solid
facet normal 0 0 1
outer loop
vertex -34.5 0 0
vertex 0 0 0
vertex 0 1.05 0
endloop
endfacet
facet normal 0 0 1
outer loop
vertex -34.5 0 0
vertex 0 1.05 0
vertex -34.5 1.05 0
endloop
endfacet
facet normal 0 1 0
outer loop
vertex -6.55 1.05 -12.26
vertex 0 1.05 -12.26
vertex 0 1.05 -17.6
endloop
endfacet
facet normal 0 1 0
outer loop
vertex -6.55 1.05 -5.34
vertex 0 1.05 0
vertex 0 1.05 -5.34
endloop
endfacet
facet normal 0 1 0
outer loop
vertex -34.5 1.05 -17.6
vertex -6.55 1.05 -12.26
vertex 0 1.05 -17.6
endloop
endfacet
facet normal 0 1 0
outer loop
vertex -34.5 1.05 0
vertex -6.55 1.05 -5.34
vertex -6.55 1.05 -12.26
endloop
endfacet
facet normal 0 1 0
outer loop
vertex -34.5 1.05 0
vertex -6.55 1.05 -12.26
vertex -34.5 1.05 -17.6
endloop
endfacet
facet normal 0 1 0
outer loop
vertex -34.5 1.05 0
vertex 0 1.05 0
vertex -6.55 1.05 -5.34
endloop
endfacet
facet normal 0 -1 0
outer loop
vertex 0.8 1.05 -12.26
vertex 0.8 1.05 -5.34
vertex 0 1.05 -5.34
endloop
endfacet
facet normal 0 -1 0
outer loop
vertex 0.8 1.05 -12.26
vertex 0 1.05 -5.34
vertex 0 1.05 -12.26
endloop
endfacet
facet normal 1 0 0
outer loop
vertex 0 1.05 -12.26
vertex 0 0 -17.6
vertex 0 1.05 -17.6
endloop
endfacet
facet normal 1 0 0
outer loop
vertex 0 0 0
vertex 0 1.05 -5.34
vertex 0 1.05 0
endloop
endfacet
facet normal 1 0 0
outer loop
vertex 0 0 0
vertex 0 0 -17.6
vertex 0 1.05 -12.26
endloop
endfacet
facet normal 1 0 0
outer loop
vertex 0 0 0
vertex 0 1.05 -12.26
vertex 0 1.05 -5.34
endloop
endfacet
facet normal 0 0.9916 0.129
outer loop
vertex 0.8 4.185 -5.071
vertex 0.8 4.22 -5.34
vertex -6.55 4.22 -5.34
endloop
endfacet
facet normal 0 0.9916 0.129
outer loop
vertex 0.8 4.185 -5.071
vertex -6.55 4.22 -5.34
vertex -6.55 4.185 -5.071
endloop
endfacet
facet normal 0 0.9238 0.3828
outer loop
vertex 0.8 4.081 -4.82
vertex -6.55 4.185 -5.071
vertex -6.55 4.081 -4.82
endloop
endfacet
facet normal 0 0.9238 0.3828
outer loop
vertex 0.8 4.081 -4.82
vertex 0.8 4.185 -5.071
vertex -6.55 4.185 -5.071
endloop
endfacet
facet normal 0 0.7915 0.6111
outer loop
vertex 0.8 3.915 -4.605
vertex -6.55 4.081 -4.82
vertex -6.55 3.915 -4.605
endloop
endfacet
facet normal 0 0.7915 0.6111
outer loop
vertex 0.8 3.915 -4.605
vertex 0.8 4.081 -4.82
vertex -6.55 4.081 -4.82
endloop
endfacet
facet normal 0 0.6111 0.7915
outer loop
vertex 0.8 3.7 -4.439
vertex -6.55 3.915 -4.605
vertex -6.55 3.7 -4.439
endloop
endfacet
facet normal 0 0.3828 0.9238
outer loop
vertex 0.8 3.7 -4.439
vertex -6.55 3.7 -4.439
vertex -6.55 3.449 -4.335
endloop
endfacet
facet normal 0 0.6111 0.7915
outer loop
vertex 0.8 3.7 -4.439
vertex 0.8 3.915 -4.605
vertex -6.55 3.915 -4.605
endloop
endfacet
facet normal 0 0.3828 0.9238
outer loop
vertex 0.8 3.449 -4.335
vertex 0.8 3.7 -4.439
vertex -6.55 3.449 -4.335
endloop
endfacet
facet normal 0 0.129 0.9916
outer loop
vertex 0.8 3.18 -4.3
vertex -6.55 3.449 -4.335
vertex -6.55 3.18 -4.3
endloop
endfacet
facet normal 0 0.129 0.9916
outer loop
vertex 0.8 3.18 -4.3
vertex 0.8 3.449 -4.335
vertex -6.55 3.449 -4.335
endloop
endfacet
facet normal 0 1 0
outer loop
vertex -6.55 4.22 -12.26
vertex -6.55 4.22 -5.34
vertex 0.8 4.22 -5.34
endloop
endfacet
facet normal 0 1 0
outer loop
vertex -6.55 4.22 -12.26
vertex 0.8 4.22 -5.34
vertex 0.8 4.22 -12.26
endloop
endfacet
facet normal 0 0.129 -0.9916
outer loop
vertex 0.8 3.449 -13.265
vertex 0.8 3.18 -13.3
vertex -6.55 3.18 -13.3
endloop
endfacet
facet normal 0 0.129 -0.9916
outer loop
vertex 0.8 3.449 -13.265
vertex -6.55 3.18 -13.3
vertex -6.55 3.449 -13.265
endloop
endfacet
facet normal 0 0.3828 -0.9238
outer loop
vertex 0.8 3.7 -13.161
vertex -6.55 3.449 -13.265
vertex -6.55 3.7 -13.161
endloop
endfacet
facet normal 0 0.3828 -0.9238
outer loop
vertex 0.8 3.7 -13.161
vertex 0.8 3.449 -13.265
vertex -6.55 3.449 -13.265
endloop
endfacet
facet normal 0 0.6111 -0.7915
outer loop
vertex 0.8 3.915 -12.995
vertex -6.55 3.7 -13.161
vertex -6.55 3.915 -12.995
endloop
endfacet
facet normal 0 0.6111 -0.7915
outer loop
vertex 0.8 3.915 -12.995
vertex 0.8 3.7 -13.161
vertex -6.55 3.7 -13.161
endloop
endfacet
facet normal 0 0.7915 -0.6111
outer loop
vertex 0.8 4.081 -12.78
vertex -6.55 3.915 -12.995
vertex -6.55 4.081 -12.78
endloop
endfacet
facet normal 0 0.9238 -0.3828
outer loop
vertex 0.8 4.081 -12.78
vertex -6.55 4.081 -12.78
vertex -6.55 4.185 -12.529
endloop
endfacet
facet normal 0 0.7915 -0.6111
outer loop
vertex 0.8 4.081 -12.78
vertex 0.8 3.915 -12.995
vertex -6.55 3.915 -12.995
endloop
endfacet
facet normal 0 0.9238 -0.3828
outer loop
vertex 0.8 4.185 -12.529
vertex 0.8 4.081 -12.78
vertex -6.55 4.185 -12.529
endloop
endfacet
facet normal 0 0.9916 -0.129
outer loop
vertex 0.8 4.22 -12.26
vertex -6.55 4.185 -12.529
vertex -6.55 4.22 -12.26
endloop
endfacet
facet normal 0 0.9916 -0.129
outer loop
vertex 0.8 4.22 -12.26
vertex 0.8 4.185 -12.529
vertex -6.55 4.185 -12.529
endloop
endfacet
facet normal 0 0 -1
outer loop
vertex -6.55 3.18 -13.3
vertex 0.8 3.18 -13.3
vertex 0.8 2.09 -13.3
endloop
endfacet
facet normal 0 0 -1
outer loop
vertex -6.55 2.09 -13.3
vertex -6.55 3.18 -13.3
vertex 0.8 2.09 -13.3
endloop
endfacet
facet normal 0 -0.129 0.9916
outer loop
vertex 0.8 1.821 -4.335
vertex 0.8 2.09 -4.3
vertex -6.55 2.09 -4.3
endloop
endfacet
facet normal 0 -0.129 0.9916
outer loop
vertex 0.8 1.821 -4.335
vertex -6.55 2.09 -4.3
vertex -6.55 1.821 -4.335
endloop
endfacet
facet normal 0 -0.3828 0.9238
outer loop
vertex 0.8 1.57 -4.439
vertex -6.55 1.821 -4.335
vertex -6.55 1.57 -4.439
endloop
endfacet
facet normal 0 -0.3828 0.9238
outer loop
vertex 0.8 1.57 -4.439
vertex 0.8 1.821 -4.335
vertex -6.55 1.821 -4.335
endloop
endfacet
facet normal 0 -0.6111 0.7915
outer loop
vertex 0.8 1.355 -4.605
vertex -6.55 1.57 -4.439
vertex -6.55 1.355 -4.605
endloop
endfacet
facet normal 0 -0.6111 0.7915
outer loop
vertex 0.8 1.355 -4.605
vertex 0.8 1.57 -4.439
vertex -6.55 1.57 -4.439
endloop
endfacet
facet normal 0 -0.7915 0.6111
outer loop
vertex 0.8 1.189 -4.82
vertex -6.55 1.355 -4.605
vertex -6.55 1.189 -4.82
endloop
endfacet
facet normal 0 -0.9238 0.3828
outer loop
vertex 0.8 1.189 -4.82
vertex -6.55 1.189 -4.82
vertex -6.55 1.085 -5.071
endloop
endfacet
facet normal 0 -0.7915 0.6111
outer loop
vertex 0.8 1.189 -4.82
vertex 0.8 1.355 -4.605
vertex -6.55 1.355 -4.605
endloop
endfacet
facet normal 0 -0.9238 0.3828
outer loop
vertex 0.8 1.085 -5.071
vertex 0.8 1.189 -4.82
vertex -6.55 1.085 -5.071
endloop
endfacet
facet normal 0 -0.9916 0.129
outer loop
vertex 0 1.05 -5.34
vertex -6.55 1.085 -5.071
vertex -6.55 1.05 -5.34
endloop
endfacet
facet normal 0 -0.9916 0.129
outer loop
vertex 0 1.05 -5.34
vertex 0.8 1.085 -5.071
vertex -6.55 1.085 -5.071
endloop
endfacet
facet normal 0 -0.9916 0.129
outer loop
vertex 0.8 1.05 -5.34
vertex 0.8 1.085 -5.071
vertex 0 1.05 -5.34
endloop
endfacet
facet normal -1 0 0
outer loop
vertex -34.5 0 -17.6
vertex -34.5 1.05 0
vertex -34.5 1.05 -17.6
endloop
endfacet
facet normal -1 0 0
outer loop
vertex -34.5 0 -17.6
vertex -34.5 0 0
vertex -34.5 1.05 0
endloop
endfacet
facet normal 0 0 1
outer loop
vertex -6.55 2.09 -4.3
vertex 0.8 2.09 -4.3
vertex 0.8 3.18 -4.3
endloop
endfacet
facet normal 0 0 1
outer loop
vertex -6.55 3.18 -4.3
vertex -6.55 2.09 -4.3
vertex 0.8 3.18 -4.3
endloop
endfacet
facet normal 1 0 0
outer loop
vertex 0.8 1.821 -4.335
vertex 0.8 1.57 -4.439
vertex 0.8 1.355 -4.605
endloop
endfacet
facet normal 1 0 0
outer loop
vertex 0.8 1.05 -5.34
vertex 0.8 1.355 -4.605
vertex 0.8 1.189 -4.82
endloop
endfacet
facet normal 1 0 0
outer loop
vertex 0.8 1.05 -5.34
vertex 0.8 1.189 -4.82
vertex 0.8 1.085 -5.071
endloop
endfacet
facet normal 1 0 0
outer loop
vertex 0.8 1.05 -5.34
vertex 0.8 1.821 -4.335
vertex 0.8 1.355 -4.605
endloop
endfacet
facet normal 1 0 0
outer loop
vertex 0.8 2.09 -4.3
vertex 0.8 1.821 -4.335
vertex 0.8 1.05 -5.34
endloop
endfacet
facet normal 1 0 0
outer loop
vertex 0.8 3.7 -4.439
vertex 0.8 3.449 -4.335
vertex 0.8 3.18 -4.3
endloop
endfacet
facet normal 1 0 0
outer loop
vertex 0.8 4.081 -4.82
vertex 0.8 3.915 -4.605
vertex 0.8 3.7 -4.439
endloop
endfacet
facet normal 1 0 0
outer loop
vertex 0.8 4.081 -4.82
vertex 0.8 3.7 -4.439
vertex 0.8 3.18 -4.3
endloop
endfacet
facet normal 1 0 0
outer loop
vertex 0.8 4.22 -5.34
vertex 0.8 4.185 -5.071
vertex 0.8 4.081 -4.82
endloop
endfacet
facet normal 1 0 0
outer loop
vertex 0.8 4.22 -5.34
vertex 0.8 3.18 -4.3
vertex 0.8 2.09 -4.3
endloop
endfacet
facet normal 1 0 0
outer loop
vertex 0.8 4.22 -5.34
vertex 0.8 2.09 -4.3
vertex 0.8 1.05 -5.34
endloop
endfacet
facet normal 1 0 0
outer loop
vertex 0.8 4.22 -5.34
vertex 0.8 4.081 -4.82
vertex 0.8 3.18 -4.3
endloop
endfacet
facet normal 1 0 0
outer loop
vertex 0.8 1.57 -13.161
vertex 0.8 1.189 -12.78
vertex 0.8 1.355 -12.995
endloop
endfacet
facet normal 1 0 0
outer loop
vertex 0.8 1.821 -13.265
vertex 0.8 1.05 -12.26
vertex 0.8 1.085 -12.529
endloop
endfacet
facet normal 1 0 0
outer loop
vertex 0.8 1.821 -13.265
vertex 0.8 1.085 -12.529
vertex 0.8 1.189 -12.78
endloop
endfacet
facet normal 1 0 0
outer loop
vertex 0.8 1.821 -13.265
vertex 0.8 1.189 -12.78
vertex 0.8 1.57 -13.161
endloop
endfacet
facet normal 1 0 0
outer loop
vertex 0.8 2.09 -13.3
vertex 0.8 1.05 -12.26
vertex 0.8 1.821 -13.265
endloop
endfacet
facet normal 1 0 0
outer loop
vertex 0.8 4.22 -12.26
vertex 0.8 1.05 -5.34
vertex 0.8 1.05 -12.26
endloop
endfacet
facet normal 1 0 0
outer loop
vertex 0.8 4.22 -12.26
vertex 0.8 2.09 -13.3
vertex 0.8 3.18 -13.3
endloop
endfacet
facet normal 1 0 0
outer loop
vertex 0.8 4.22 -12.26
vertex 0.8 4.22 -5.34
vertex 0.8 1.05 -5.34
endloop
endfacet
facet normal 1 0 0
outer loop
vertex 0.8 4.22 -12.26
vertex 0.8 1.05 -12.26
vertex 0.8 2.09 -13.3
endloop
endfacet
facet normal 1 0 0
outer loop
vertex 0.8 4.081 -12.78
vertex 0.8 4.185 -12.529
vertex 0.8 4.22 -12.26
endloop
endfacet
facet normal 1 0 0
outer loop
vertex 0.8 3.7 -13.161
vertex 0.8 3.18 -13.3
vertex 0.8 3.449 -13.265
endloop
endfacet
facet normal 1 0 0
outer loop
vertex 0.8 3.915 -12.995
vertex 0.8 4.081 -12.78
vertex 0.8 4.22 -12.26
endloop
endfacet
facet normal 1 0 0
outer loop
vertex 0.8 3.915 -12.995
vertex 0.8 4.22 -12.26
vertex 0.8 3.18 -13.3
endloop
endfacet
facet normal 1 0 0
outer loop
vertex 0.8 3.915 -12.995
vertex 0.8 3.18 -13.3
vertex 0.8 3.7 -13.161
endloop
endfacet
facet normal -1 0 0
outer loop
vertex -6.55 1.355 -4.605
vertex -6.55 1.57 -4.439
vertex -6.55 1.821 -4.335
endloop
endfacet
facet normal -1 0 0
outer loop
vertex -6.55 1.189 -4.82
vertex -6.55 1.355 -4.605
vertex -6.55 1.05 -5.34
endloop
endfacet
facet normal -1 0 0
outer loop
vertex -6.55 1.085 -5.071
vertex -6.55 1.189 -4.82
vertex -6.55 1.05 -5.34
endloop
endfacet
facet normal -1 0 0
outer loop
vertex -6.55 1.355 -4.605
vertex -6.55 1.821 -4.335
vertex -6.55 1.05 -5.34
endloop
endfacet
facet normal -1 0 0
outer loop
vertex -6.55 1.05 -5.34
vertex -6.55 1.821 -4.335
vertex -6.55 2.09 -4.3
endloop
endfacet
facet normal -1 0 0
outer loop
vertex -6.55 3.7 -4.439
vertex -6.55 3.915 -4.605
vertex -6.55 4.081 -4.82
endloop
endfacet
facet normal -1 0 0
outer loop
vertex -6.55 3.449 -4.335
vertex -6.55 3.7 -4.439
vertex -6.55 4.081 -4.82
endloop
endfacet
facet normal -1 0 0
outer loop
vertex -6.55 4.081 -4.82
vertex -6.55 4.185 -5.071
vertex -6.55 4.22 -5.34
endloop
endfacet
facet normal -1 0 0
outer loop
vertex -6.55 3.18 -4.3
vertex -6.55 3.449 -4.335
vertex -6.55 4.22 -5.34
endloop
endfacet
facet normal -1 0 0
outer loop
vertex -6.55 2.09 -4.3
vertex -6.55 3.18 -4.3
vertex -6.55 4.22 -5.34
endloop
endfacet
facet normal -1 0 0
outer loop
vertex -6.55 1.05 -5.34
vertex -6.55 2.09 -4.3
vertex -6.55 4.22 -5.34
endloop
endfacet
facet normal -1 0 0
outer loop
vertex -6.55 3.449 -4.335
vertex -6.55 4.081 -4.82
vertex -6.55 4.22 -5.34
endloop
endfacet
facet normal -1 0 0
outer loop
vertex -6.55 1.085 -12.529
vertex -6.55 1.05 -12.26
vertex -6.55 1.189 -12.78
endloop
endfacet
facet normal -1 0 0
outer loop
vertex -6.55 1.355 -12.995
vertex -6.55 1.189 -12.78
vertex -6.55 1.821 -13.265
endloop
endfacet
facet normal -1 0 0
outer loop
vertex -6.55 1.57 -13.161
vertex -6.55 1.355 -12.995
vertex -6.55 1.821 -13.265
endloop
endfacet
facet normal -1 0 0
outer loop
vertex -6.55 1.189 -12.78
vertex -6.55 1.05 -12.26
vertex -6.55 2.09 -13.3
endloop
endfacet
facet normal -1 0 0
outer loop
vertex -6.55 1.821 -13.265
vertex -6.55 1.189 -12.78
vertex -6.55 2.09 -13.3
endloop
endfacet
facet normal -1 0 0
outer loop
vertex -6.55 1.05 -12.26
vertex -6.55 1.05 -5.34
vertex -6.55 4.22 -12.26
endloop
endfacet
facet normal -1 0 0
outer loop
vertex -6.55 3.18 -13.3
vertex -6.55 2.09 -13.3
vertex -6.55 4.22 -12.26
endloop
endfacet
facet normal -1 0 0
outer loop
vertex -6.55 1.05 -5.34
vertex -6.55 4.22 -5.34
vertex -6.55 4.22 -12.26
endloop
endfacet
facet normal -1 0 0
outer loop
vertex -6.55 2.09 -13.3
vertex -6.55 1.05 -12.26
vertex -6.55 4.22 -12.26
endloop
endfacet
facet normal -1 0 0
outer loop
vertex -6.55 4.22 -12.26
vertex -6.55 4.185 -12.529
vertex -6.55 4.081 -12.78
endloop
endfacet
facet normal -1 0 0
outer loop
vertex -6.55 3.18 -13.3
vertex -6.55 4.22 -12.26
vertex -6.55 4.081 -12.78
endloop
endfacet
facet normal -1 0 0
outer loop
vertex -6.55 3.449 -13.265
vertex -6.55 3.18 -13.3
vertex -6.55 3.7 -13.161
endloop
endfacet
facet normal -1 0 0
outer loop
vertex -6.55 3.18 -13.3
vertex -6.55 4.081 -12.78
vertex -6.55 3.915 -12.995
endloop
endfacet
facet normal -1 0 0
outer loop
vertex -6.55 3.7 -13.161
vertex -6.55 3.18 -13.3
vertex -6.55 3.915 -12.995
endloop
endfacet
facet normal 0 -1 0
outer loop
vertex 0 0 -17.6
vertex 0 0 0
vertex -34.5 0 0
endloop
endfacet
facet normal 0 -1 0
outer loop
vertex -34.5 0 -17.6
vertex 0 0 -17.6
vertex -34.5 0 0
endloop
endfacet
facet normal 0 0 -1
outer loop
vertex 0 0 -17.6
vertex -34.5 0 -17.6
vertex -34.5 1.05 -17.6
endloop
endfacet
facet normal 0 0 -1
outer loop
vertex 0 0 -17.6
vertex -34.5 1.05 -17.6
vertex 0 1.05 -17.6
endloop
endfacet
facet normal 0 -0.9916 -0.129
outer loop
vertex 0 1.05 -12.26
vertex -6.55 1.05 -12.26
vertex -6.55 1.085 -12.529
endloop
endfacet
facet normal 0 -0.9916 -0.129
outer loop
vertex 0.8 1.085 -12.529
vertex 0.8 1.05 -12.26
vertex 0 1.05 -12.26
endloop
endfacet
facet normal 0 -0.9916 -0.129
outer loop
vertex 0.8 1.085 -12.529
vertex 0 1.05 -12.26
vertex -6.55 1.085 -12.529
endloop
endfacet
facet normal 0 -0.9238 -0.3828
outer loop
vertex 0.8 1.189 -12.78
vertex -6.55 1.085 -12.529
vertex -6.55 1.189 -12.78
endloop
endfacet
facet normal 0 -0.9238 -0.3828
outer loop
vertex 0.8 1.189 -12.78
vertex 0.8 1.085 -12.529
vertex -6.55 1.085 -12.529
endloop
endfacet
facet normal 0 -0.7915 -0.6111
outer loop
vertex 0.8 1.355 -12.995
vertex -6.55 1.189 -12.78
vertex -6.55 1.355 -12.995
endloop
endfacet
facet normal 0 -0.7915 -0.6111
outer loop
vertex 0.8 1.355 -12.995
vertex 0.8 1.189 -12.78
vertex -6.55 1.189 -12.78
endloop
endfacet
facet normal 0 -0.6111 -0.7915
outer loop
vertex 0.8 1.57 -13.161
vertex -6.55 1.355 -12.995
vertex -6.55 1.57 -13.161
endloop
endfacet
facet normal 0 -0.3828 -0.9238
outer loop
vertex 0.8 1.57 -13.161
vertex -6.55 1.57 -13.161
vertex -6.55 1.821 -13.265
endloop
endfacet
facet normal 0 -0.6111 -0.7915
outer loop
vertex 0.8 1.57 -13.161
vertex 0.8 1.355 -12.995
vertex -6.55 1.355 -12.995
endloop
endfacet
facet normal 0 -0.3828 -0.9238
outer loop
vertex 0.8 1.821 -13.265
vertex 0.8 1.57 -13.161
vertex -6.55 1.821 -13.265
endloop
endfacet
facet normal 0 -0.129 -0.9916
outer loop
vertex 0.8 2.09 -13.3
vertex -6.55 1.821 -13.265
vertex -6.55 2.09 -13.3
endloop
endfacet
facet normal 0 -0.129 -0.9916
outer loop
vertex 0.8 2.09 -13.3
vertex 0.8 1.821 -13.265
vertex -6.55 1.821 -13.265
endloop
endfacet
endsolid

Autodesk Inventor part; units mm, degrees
ref_plane "YZ Plane" through (0, 0, 0) normal (1, 0, 0) x (0, 1, 0)
ref_plane "XZ Plane" through (0, 0, 0) normal (0, 1, 0) x (-1, 0, 0)
sketch "Sketch1" plane through (0, 0, 0) normal (0, 1, 0) x (-1, 0, 0)
  line L0 (0, 0) -> (34.5, 0)
  line L1 (34.5, 0) -> (34.5, -17.6)
  line L2 (34.5, -17.6) -> (0, -17.6)
  line L3 (0, -17.6) -> (0, 0)
  dimension "d0" = 17.6
  dimension "d1" = 34.5
extrude "Extrusion1" add sketch "Sketch1" along normal blind 1.05
ref_plane "Work Plane1" through (0.8, 0, 0) normal (1, 0, 0) x (0, 0, -1)
sketch "Sketch2" plane through (0.8, 0, 0) normal (1, 0, 0) x (0, 0, -1)
  line L0 (0, 0) -> (17.6, 0) projected
  line L1 (17.6, 0) -> (17.6, 1.05) projected
  line L2 (0, 1.05) -> (17.6, 1.05) projected
  line L3 (0, 0) -> (0, 1.05) projected
  line L4 (17.6, 0) -> (0, 0) construction
  line L5 (8.8, 0) -> (8.8, 1.05) construction
  line L6 (17.6, 1.05) -> (0, 1.05) construction
  line L7 (5.34, 4.22) -> (12.26, 4.22)
  line L8 (13.3, 3.18) -> (13.3, 2.09)
  line L9 (12.26, 1.05) -> (5.34, 1.05)
  line L10 (4.3, 2.09) -> (4.3, 3.18)
  line L11 (0, 1.05) -> (17.6, 1.05) projected
  arc A0 (5.34, 4.22) -> (4.3, 3.18) centre (5.34, 3.18) ccw
  arc A1 (4.3, 2.09) -> (5.34, 1.05) centre (5.34, 2.09) ccw
  arc A2 (13.3, 3.18) -> (12.26, 4.22) centre (12.26, 3.18) ccw
  arc A3 (12.26, 1.05) -> (13.3, 2.09) centre (12.26, 2.09) ccw
  point P0 (4.3, 4.22)
  point P1 (13.3, 4.22)
  point P2 (4.3, 1.05)
  point P3 (5.34, 1.05)
  point P4 (12.26, 1.05)
  dimension "d5" = 9
  dimension "d6" = 3.17
  dimension "d7" = 1.04
extrude "Extrusion2" add sketch "Sketch2" against normal blind 7.35 contours A1 L10 A0 L7 A2 L8 A3 L2
equation "\"d2\" = pcbThickness"
equation "\"pcbThickness\" = 1.05"
equation "\"usbcEdgeOffset\" = 0.8"
equation "\"d4\" = usbcEdgeOffset"
properties part number "MCU_TinyPICO"
